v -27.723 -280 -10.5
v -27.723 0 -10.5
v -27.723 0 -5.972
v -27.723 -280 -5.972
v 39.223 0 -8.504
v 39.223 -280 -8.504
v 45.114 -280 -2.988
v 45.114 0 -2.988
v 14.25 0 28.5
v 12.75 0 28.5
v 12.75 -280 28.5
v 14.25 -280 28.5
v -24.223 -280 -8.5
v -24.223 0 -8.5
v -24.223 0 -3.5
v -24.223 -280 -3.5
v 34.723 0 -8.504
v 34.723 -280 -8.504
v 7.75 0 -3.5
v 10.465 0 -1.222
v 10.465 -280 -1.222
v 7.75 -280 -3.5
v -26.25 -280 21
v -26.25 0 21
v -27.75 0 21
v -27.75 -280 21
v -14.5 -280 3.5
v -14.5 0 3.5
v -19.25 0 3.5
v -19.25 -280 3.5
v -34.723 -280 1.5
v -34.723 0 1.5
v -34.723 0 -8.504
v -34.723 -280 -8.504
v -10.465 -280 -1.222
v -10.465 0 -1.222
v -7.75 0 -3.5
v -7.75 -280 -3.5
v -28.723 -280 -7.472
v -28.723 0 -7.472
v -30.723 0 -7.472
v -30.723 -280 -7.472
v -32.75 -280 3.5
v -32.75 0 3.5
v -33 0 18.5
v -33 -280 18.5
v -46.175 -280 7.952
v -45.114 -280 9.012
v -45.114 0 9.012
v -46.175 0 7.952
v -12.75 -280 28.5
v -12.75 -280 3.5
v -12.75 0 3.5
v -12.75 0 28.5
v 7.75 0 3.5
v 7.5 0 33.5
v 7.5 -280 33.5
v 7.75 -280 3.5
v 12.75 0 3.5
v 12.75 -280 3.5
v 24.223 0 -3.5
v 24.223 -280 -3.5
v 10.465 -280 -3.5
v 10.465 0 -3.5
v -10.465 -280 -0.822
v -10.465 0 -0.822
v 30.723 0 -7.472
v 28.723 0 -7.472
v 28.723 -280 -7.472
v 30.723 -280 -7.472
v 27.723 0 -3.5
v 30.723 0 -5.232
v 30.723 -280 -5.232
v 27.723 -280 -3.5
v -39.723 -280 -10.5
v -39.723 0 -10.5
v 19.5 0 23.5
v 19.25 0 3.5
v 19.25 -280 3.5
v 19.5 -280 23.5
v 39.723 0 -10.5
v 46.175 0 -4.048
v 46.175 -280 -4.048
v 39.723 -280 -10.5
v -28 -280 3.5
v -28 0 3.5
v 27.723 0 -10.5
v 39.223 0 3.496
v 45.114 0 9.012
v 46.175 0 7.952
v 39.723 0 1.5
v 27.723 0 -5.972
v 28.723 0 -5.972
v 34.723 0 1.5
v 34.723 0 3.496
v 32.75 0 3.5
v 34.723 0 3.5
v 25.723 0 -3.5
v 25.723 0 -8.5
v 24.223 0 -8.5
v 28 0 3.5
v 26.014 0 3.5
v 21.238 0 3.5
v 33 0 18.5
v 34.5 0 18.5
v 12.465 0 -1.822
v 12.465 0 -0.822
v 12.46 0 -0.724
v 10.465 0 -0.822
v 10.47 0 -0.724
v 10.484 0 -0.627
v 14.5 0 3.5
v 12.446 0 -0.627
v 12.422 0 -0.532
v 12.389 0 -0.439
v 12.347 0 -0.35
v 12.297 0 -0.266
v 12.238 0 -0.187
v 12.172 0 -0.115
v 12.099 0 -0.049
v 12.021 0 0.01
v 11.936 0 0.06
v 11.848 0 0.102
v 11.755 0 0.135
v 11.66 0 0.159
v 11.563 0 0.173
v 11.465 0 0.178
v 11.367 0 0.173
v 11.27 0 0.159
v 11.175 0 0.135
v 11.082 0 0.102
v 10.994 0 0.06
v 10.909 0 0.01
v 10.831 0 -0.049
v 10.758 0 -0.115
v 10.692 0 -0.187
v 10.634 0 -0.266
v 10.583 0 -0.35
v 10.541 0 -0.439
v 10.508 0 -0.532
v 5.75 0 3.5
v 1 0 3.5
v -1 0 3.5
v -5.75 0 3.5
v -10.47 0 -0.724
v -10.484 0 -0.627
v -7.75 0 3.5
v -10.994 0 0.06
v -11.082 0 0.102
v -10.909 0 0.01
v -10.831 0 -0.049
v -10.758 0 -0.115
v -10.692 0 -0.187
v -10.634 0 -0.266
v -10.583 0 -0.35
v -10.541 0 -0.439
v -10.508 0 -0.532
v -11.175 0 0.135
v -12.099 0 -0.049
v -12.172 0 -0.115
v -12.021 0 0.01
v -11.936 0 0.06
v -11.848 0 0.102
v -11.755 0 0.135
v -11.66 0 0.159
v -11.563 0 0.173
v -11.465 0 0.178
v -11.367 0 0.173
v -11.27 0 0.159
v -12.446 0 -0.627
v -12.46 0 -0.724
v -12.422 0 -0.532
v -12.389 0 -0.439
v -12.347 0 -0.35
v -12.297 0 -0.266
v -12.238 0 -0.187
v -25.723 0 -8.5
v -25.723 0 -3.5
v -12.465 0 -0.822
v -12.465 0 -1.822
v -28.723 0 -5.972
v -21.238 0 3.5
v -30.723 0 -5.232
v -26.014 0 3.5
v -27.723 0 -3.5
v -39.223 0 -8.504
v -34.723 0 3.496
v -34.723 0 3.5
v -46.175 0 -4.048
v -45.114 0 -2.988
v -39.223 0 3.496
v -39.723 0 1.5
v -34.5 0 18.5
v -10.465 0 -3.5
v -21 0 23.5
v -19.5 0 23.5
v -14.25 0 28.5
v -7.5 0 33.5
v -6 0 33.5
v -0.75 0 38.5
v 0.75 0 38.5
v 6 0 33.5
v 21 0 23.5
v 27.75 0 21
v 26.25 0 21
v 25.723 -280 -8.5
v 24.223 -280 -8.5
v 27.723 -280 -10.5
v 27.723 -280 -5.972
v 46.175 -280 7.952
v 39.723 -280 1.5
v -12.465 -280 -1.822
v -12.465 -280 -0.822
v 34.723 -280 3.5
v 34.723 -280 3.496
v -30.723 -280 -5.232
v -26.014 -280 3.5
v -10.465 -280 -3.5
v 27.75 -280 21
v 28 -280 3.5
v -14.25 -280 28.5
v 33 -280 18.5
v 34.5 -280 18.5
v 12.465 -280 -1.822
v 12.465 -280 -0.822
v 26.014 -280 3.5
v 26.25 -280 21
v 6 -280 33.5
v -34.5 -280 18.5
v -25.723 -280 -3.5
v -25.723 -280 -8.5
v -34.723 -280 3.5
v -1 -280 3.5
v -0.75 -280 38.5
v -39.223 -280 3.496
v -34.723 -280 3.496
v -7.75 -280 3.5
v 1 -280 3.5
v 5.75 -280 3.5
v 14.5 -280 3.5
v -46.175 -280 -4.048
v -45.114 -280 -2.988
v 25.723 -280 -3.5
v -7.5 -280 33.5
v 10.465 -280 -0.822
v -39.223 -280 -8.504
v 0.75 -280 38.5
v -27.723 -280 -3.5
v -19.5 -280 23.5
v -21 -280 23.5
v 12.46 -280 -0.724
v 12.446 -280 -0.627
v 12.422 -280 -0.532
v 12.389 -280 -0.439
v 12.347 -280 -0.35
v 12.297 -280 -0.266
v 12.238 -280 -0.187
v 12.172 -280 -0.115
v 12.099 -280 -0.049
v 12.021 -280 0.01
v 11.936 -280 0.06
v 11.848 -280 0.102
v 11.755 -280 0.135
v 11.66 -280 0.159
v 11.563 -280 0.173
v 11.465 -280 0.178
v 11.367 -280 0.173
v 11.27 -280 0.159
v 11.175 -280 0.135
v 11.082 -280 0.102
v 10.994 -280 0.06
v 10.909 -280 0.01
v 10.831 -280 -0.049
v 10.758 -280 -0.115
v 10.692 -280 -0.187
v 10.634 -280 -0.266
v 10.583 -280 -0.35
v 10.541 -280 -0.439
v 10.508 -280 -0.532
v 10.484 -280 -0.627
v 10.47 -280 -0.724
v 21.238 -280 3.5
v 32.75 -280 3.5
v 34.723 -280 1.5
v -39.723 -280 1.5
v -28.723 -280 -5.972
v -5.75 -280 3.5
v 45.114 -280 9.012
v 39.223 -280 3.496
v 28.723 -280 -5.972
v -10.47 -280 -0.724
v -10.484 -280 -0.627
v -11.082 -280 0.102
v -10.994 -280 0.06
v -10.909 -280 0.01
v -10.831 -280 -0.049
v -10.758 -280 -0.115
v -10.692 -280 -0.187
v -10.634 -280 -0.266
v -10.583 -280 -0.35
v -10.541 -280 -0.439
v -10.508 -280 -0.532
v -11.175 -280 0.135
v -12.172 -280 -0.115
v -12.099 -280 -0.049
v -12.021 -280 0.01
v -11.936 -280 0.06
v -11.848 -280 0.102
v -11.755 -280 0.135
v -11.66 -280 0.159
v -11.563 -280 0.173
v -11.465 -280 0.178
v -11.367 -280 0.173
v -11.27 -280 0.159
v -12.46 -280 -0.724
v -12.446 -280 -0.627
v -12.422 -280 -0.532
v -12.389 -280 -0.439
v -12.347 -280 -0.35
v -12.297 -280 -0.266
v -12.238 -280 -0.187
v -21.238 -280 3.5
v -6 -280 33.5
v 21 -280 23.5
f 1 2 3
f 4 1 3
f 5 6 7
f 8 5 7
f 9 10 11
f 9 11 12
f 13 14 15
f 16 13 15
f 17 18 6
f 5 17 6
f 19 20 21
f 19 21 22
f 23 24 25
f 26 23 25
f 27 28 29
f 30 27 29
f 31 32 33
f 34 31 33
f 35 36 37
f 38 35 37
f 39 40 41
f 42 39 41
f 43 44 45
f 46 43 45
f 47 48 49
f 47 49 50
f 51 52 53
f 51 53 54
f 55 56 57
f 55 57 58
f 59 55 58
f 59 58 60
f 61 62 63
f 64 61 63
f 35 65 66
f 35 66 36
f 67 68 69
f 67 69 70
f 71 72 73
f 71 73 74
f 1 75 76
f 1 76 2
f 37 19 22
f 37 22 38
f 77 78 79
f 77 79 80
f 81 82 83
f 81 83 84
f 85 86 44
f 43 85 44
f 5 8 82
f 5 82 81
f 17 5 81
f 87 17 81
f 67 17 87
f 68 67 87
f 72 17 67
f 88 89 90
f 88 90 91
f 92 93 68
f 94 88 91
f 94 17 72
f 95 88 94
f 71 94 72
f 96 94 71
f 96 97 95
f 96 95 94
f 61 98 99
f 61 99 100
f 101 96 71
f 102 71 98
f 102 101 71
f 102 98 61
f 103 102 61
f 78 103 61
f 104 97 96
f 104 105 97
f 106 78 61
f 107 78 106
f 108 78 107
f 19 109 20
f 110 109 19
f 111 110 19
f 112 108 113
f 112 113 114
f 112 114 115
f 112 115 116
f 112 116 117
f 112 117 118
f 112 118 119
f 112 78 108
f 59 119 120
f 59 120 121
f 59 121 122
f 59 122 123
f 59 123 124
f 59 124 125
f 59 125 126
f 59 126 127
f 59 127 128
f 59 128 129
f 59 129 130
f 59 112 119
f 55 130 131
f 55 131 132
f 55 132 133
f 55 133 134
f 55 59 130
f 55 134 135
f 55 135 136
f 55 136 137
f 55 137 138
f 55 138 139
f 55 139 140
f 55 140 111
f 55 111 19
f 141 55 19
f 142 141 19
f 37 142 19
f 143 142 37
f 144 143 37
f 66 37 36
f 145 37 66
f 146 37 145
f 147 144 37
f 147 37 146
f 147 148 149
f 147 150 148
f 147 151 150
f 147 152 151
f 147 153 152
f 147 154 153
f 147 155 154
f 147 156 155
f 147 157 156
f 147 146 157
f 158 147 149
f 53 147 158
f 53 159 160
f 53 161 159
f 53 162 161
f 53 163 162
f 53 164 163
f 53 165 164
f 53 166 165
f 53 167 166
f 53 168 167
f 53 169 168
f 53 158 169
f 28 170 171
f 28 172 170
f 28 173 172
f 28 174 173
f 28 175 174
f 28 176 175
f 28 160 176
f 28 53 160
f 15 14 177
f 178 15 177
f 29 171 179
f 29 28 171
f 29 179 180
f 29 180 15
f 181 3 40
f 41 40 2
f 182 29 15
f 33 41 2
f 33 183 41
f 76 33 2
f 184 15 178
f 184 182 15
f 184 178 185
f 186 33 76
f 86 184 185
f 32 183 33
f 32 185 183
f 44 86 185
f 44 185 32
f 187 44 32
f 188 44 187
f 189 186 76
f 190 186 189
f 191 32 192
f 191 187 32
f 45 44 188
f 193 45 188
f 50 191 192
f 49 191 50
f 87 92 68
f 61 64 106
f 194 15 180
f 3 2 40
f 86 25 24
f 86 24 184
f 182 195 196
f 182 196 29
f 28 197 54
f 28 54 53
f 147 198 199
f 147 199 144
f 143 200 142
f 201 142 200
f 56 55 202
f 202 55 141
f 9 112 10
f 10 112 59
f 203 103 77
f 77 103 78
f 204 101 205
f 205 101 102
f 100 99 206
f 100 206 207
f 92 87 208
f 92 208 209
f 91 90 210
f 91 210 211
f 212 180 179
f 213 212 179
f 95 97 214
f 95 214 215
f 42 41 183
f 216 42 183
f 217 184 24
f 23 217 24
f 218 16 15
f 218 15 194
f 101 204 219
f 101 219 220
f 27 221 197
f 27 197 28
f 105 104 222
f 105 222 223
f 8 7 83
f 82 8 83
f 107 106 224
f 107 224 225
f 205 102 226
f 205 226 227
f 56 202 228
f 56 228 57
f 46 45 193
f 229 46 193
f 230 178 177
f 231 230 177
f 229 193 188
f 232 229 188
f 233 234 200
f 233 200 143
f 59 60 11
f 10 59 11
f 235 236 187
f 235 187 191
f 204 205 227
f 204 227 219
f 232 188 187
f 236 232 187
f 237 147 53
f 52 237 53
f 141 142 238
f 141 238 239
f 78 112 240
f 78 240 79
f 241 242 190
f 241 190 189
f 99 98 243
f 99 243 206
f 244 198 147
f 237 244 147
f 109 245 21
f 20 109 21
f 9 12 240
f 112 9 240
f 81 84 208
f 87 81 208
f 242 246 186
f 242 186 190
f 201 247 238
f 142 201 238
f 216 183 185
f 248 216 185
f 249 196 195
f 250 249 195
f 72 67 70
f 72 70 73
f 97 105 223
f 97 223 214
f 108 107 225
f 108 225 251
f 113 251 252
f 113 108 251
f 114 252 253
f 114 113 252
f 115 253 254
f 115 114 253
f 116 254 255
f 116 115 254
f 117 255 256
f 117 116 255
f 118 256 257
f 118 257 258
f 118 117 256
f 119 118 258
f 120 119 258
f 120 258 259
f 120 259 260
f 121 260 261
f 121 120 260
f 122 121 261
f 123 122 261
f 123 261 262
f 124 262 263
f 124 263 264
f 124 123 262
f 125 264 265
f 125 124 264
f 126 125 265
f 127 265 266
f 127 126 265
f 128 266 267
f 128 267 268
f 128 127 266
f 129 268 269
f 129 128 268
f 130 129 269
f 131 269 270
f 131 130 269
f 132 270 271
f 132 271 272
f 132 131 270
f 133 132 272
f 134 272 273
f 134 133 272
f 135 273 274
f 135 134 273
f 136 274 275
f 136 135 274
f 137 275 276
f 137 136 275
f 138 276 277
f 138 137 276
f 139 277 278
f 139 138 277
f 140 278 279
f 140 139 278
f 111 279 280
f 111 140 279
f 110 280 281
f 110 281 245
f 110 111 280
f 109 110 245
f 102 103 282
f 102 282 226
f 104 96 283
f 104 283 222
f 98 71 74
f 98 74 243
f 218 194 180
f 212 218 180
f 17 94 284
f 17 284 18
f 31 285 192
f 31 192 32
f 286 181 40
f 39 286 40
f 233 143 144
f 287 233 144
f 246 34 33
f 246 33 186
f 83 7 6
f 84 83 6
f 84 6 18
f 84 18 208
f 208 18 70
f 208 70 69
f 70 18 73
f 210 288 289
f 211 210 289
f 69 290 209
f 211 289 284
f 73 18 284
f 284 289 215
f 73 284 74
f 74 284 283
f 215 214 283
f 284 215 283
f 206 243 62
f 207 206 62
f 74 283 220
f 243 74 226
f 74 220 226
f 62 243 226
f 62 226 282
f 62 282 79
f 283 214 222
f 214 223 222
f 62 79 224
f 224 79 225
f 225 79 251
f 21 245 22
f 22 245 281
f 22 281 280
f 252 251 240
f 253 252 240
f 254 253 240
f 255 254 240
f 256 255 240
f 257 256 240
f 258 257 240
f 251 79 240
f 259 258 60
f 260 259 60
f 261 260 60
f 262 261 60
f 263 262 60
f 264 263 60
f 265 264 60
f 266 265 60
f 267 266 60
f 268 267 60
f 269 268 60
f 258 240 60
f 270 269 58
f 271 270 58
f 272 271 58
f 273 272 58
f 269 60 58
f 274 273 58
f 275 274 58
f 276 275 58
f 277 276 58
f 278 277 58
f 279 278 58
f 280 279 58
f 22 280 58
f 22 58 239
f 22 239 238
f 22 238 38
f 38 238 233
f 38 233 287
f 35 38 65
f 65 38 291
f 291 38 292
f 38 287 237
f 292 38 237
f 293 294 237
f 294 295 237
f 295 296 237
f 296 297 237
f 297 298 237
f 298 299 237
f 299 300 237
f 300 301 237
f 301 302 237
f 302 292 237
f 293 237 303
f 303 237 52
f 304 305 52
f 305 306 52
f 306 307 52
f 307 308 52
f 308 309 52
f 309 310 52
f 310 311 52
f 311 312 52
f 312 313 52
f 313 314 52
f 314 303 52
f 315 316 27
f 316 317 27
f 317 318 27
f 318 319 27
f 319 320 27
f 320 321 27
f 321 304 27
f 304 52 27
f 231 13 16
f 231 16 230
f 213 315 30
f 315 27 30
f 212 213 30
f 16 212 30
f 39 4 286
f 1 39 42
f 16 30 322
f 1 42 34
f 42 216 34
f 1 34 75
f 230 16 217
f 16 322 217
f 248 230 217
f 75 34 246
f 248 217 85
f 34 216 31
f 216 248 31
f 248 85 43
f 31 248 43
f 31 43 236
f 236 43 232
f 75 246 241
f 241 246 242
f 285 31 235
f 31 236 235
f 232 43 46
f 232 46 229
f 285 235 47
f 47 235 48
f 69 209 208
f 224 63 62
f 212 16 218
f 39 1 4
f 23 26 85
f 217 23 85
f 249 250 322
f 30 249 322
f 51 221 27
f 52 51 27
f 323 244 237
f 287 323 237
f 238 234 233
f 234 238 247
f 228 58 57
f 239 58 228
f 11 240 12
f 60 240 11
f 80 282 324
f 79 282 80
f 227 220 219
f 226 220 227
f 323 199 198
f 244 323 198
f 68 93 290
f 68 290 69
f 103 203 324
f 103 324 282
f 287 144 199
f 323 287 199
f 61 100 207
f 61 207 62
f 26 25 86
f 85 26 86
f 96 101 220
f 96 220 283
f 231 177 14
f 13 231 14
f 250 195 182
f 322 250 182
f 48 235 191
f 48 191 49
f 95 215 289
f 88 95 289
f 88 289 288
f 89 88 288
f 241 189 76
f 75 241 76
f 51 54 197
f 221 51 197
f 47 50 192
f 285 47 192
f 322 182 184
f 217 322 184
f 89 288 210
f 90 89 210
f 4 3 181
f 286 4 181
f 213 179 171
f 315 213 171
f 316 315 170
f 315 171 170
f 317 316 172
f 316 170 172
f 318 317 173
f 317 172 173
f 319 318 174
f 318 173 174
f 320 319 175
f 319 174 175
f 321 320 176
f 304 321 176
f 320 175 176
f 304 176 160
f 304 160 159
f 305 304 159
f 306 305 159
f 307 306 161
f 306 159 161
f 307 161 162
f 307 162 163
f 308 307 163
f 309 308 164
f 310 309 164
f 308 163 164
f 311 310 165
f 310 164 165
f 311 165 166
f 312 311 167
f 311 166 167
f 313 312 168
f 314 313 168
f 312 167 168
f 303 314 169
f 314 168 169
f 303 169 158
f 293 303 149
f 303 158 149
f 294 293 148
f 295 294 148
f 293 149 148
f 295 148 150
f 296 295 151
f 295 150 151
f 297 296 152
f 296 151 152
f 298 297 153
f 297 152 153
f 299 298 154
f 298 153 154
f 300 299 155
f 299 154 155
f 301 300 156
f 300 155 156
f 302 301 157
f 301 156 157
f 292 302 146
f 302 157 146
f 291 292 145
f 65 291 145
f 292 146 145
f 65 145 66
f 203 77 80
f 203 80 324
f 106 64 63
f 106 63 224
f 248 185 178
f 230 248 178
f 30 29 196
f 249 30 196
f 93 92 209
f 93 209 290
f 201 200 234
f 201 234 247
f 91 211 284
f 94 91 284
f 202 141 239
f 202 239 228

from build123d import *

# Parameters (mm, degrees)
F1_DEPTH = 280
F3_DEPTH = 280


with BuildPart() as f1:
    # F0 (on Front) → F1 (new body)
    with BuildSketch(Plane.XZ):
        with BuildLine():
            Line((-32.75, 3.5), (-33, 18.5))
            Line((-33, 18.5), (-34.5, 18.5))
            Line((-34.5, 18.5), (-34.722757, 3.5))
            Line((-34.722757, 3.5), (-34.722757, -10.5))
            Line((-34.722757, -10.5), (-27.722757, -10.5))
            Line((-27.722757, -10.5), (-27.722757, -5.971823))
            Line((-27.722757, -5.971823), (-28.722757, -5.971823))
            Line((-28.722757, -5.971823), (-28.722757, -7.471823))
            Line((-28.722757, -7.471823), (-30.722757, -7.471823))
            Line((-30.722757, -7.471823), (-30.722757, -5.232051))
            Line((-30.722757, -5.232051), (-27.722757, -3.5))
            Line((-27.722757, -3.5), (-25.722757, -3.5))
            Line((-25.722757, -3.5), (-25.722757, -8.5))
            Line((-25.722757, -8.5), (-24.222757, -8.5))
            Line((-24.222757, -8.5), (-24.222757, -3.5))
            Line((-24.222757, -3.5), (-10.465052, -3.5))
            Line((-10.465052, -3.5), (-12.465052, -1.821801))
            Line((-12.465052, -1.821801), (-12.465052, -0.821801))
            ThreePointArc((-12.465052, -0.821801), (-11.465052, 0.178199), (-10.465052, -0.821801))
            Line((-10.465052, -0.821801), (-10.465052, -1.221801))
            Line((-10.465052, -1.221801), (-7.75, -3.5))
            Line((-7.75, -3.5), (0, -3.5))
            Line((0, -3.5), (0, 38.5))
            Line((0, 38.5), (-0.75, 38.5))
            Line((-0.75, 38.5), (-1, 3.5))
            Line((-1, 3.5), (-5.75, 3.5))
            Line((-5.75, 3.5), (-6, 33.5))
            Line((-6, 33.5), (-7.5, 33.5))
            Line((-7.5, 33.5), (-7.75, 3.5))
            Line((-7.75, 3.5), (-12.75, 3.5))
            Line((-12.75, 3.5), (-12.75, 28.5))
            Line((-12.75, 28.5), (-14.25, 28.5))
            Line((-14.25, 28.5), (-14.5, 3.5))
            Line((-14.5, 3.5), (-19.25, 3.5))
            Line((-19.25, 3.5), (-19.5, 23.5))
            Line((-19.5, 23.5), (-21, 23.5))
            Line((-21, 23.5), (-21.238413, 3.5))
            Line((-21.238413, 3.5), (-26.014383, 3.5))
            Line((-26.014383, 3.5), (-26.25, 21))
            Line((-26.25, 21), (-27.75, 21))
            Line((-27.75, 21), (-28, 3.5))
            Line((-28, 3.5), (-32.75, 3.5))
        make_face()
    extrude(amount=F1_DEPTH)

    # F2 (on face) → F3 (join)
    with BuildSketch(Plane.XZ.offset(280)):
        Polygon((-34.722757, -10.5), (-34.722757, -8.503925), (-39.222757, -8.503925), (-45.113872, -2.987565), (-46.174532, -4.048225), (-39.722757, -10.5), align=None)
        Polygon((-46.174532, 7.951775), (-39.722757, 1.5), (-34.722757, 1.5), (-34.722757, 3.496075), (-39.222757, 3.496075), (-45.113872, 9.012435), align=None)
    extrude(amount=-F3_DEPTH)

    # F4: F1 across face


with BuildPart() as f1_1:
    add(f1.part)
    add(f1.part.mirror(Plane(origin=(0, -140, 17.5), x_dir=(0, 1, 0), z_dir=(1, 0, 0))))


solid = f1_1.part
